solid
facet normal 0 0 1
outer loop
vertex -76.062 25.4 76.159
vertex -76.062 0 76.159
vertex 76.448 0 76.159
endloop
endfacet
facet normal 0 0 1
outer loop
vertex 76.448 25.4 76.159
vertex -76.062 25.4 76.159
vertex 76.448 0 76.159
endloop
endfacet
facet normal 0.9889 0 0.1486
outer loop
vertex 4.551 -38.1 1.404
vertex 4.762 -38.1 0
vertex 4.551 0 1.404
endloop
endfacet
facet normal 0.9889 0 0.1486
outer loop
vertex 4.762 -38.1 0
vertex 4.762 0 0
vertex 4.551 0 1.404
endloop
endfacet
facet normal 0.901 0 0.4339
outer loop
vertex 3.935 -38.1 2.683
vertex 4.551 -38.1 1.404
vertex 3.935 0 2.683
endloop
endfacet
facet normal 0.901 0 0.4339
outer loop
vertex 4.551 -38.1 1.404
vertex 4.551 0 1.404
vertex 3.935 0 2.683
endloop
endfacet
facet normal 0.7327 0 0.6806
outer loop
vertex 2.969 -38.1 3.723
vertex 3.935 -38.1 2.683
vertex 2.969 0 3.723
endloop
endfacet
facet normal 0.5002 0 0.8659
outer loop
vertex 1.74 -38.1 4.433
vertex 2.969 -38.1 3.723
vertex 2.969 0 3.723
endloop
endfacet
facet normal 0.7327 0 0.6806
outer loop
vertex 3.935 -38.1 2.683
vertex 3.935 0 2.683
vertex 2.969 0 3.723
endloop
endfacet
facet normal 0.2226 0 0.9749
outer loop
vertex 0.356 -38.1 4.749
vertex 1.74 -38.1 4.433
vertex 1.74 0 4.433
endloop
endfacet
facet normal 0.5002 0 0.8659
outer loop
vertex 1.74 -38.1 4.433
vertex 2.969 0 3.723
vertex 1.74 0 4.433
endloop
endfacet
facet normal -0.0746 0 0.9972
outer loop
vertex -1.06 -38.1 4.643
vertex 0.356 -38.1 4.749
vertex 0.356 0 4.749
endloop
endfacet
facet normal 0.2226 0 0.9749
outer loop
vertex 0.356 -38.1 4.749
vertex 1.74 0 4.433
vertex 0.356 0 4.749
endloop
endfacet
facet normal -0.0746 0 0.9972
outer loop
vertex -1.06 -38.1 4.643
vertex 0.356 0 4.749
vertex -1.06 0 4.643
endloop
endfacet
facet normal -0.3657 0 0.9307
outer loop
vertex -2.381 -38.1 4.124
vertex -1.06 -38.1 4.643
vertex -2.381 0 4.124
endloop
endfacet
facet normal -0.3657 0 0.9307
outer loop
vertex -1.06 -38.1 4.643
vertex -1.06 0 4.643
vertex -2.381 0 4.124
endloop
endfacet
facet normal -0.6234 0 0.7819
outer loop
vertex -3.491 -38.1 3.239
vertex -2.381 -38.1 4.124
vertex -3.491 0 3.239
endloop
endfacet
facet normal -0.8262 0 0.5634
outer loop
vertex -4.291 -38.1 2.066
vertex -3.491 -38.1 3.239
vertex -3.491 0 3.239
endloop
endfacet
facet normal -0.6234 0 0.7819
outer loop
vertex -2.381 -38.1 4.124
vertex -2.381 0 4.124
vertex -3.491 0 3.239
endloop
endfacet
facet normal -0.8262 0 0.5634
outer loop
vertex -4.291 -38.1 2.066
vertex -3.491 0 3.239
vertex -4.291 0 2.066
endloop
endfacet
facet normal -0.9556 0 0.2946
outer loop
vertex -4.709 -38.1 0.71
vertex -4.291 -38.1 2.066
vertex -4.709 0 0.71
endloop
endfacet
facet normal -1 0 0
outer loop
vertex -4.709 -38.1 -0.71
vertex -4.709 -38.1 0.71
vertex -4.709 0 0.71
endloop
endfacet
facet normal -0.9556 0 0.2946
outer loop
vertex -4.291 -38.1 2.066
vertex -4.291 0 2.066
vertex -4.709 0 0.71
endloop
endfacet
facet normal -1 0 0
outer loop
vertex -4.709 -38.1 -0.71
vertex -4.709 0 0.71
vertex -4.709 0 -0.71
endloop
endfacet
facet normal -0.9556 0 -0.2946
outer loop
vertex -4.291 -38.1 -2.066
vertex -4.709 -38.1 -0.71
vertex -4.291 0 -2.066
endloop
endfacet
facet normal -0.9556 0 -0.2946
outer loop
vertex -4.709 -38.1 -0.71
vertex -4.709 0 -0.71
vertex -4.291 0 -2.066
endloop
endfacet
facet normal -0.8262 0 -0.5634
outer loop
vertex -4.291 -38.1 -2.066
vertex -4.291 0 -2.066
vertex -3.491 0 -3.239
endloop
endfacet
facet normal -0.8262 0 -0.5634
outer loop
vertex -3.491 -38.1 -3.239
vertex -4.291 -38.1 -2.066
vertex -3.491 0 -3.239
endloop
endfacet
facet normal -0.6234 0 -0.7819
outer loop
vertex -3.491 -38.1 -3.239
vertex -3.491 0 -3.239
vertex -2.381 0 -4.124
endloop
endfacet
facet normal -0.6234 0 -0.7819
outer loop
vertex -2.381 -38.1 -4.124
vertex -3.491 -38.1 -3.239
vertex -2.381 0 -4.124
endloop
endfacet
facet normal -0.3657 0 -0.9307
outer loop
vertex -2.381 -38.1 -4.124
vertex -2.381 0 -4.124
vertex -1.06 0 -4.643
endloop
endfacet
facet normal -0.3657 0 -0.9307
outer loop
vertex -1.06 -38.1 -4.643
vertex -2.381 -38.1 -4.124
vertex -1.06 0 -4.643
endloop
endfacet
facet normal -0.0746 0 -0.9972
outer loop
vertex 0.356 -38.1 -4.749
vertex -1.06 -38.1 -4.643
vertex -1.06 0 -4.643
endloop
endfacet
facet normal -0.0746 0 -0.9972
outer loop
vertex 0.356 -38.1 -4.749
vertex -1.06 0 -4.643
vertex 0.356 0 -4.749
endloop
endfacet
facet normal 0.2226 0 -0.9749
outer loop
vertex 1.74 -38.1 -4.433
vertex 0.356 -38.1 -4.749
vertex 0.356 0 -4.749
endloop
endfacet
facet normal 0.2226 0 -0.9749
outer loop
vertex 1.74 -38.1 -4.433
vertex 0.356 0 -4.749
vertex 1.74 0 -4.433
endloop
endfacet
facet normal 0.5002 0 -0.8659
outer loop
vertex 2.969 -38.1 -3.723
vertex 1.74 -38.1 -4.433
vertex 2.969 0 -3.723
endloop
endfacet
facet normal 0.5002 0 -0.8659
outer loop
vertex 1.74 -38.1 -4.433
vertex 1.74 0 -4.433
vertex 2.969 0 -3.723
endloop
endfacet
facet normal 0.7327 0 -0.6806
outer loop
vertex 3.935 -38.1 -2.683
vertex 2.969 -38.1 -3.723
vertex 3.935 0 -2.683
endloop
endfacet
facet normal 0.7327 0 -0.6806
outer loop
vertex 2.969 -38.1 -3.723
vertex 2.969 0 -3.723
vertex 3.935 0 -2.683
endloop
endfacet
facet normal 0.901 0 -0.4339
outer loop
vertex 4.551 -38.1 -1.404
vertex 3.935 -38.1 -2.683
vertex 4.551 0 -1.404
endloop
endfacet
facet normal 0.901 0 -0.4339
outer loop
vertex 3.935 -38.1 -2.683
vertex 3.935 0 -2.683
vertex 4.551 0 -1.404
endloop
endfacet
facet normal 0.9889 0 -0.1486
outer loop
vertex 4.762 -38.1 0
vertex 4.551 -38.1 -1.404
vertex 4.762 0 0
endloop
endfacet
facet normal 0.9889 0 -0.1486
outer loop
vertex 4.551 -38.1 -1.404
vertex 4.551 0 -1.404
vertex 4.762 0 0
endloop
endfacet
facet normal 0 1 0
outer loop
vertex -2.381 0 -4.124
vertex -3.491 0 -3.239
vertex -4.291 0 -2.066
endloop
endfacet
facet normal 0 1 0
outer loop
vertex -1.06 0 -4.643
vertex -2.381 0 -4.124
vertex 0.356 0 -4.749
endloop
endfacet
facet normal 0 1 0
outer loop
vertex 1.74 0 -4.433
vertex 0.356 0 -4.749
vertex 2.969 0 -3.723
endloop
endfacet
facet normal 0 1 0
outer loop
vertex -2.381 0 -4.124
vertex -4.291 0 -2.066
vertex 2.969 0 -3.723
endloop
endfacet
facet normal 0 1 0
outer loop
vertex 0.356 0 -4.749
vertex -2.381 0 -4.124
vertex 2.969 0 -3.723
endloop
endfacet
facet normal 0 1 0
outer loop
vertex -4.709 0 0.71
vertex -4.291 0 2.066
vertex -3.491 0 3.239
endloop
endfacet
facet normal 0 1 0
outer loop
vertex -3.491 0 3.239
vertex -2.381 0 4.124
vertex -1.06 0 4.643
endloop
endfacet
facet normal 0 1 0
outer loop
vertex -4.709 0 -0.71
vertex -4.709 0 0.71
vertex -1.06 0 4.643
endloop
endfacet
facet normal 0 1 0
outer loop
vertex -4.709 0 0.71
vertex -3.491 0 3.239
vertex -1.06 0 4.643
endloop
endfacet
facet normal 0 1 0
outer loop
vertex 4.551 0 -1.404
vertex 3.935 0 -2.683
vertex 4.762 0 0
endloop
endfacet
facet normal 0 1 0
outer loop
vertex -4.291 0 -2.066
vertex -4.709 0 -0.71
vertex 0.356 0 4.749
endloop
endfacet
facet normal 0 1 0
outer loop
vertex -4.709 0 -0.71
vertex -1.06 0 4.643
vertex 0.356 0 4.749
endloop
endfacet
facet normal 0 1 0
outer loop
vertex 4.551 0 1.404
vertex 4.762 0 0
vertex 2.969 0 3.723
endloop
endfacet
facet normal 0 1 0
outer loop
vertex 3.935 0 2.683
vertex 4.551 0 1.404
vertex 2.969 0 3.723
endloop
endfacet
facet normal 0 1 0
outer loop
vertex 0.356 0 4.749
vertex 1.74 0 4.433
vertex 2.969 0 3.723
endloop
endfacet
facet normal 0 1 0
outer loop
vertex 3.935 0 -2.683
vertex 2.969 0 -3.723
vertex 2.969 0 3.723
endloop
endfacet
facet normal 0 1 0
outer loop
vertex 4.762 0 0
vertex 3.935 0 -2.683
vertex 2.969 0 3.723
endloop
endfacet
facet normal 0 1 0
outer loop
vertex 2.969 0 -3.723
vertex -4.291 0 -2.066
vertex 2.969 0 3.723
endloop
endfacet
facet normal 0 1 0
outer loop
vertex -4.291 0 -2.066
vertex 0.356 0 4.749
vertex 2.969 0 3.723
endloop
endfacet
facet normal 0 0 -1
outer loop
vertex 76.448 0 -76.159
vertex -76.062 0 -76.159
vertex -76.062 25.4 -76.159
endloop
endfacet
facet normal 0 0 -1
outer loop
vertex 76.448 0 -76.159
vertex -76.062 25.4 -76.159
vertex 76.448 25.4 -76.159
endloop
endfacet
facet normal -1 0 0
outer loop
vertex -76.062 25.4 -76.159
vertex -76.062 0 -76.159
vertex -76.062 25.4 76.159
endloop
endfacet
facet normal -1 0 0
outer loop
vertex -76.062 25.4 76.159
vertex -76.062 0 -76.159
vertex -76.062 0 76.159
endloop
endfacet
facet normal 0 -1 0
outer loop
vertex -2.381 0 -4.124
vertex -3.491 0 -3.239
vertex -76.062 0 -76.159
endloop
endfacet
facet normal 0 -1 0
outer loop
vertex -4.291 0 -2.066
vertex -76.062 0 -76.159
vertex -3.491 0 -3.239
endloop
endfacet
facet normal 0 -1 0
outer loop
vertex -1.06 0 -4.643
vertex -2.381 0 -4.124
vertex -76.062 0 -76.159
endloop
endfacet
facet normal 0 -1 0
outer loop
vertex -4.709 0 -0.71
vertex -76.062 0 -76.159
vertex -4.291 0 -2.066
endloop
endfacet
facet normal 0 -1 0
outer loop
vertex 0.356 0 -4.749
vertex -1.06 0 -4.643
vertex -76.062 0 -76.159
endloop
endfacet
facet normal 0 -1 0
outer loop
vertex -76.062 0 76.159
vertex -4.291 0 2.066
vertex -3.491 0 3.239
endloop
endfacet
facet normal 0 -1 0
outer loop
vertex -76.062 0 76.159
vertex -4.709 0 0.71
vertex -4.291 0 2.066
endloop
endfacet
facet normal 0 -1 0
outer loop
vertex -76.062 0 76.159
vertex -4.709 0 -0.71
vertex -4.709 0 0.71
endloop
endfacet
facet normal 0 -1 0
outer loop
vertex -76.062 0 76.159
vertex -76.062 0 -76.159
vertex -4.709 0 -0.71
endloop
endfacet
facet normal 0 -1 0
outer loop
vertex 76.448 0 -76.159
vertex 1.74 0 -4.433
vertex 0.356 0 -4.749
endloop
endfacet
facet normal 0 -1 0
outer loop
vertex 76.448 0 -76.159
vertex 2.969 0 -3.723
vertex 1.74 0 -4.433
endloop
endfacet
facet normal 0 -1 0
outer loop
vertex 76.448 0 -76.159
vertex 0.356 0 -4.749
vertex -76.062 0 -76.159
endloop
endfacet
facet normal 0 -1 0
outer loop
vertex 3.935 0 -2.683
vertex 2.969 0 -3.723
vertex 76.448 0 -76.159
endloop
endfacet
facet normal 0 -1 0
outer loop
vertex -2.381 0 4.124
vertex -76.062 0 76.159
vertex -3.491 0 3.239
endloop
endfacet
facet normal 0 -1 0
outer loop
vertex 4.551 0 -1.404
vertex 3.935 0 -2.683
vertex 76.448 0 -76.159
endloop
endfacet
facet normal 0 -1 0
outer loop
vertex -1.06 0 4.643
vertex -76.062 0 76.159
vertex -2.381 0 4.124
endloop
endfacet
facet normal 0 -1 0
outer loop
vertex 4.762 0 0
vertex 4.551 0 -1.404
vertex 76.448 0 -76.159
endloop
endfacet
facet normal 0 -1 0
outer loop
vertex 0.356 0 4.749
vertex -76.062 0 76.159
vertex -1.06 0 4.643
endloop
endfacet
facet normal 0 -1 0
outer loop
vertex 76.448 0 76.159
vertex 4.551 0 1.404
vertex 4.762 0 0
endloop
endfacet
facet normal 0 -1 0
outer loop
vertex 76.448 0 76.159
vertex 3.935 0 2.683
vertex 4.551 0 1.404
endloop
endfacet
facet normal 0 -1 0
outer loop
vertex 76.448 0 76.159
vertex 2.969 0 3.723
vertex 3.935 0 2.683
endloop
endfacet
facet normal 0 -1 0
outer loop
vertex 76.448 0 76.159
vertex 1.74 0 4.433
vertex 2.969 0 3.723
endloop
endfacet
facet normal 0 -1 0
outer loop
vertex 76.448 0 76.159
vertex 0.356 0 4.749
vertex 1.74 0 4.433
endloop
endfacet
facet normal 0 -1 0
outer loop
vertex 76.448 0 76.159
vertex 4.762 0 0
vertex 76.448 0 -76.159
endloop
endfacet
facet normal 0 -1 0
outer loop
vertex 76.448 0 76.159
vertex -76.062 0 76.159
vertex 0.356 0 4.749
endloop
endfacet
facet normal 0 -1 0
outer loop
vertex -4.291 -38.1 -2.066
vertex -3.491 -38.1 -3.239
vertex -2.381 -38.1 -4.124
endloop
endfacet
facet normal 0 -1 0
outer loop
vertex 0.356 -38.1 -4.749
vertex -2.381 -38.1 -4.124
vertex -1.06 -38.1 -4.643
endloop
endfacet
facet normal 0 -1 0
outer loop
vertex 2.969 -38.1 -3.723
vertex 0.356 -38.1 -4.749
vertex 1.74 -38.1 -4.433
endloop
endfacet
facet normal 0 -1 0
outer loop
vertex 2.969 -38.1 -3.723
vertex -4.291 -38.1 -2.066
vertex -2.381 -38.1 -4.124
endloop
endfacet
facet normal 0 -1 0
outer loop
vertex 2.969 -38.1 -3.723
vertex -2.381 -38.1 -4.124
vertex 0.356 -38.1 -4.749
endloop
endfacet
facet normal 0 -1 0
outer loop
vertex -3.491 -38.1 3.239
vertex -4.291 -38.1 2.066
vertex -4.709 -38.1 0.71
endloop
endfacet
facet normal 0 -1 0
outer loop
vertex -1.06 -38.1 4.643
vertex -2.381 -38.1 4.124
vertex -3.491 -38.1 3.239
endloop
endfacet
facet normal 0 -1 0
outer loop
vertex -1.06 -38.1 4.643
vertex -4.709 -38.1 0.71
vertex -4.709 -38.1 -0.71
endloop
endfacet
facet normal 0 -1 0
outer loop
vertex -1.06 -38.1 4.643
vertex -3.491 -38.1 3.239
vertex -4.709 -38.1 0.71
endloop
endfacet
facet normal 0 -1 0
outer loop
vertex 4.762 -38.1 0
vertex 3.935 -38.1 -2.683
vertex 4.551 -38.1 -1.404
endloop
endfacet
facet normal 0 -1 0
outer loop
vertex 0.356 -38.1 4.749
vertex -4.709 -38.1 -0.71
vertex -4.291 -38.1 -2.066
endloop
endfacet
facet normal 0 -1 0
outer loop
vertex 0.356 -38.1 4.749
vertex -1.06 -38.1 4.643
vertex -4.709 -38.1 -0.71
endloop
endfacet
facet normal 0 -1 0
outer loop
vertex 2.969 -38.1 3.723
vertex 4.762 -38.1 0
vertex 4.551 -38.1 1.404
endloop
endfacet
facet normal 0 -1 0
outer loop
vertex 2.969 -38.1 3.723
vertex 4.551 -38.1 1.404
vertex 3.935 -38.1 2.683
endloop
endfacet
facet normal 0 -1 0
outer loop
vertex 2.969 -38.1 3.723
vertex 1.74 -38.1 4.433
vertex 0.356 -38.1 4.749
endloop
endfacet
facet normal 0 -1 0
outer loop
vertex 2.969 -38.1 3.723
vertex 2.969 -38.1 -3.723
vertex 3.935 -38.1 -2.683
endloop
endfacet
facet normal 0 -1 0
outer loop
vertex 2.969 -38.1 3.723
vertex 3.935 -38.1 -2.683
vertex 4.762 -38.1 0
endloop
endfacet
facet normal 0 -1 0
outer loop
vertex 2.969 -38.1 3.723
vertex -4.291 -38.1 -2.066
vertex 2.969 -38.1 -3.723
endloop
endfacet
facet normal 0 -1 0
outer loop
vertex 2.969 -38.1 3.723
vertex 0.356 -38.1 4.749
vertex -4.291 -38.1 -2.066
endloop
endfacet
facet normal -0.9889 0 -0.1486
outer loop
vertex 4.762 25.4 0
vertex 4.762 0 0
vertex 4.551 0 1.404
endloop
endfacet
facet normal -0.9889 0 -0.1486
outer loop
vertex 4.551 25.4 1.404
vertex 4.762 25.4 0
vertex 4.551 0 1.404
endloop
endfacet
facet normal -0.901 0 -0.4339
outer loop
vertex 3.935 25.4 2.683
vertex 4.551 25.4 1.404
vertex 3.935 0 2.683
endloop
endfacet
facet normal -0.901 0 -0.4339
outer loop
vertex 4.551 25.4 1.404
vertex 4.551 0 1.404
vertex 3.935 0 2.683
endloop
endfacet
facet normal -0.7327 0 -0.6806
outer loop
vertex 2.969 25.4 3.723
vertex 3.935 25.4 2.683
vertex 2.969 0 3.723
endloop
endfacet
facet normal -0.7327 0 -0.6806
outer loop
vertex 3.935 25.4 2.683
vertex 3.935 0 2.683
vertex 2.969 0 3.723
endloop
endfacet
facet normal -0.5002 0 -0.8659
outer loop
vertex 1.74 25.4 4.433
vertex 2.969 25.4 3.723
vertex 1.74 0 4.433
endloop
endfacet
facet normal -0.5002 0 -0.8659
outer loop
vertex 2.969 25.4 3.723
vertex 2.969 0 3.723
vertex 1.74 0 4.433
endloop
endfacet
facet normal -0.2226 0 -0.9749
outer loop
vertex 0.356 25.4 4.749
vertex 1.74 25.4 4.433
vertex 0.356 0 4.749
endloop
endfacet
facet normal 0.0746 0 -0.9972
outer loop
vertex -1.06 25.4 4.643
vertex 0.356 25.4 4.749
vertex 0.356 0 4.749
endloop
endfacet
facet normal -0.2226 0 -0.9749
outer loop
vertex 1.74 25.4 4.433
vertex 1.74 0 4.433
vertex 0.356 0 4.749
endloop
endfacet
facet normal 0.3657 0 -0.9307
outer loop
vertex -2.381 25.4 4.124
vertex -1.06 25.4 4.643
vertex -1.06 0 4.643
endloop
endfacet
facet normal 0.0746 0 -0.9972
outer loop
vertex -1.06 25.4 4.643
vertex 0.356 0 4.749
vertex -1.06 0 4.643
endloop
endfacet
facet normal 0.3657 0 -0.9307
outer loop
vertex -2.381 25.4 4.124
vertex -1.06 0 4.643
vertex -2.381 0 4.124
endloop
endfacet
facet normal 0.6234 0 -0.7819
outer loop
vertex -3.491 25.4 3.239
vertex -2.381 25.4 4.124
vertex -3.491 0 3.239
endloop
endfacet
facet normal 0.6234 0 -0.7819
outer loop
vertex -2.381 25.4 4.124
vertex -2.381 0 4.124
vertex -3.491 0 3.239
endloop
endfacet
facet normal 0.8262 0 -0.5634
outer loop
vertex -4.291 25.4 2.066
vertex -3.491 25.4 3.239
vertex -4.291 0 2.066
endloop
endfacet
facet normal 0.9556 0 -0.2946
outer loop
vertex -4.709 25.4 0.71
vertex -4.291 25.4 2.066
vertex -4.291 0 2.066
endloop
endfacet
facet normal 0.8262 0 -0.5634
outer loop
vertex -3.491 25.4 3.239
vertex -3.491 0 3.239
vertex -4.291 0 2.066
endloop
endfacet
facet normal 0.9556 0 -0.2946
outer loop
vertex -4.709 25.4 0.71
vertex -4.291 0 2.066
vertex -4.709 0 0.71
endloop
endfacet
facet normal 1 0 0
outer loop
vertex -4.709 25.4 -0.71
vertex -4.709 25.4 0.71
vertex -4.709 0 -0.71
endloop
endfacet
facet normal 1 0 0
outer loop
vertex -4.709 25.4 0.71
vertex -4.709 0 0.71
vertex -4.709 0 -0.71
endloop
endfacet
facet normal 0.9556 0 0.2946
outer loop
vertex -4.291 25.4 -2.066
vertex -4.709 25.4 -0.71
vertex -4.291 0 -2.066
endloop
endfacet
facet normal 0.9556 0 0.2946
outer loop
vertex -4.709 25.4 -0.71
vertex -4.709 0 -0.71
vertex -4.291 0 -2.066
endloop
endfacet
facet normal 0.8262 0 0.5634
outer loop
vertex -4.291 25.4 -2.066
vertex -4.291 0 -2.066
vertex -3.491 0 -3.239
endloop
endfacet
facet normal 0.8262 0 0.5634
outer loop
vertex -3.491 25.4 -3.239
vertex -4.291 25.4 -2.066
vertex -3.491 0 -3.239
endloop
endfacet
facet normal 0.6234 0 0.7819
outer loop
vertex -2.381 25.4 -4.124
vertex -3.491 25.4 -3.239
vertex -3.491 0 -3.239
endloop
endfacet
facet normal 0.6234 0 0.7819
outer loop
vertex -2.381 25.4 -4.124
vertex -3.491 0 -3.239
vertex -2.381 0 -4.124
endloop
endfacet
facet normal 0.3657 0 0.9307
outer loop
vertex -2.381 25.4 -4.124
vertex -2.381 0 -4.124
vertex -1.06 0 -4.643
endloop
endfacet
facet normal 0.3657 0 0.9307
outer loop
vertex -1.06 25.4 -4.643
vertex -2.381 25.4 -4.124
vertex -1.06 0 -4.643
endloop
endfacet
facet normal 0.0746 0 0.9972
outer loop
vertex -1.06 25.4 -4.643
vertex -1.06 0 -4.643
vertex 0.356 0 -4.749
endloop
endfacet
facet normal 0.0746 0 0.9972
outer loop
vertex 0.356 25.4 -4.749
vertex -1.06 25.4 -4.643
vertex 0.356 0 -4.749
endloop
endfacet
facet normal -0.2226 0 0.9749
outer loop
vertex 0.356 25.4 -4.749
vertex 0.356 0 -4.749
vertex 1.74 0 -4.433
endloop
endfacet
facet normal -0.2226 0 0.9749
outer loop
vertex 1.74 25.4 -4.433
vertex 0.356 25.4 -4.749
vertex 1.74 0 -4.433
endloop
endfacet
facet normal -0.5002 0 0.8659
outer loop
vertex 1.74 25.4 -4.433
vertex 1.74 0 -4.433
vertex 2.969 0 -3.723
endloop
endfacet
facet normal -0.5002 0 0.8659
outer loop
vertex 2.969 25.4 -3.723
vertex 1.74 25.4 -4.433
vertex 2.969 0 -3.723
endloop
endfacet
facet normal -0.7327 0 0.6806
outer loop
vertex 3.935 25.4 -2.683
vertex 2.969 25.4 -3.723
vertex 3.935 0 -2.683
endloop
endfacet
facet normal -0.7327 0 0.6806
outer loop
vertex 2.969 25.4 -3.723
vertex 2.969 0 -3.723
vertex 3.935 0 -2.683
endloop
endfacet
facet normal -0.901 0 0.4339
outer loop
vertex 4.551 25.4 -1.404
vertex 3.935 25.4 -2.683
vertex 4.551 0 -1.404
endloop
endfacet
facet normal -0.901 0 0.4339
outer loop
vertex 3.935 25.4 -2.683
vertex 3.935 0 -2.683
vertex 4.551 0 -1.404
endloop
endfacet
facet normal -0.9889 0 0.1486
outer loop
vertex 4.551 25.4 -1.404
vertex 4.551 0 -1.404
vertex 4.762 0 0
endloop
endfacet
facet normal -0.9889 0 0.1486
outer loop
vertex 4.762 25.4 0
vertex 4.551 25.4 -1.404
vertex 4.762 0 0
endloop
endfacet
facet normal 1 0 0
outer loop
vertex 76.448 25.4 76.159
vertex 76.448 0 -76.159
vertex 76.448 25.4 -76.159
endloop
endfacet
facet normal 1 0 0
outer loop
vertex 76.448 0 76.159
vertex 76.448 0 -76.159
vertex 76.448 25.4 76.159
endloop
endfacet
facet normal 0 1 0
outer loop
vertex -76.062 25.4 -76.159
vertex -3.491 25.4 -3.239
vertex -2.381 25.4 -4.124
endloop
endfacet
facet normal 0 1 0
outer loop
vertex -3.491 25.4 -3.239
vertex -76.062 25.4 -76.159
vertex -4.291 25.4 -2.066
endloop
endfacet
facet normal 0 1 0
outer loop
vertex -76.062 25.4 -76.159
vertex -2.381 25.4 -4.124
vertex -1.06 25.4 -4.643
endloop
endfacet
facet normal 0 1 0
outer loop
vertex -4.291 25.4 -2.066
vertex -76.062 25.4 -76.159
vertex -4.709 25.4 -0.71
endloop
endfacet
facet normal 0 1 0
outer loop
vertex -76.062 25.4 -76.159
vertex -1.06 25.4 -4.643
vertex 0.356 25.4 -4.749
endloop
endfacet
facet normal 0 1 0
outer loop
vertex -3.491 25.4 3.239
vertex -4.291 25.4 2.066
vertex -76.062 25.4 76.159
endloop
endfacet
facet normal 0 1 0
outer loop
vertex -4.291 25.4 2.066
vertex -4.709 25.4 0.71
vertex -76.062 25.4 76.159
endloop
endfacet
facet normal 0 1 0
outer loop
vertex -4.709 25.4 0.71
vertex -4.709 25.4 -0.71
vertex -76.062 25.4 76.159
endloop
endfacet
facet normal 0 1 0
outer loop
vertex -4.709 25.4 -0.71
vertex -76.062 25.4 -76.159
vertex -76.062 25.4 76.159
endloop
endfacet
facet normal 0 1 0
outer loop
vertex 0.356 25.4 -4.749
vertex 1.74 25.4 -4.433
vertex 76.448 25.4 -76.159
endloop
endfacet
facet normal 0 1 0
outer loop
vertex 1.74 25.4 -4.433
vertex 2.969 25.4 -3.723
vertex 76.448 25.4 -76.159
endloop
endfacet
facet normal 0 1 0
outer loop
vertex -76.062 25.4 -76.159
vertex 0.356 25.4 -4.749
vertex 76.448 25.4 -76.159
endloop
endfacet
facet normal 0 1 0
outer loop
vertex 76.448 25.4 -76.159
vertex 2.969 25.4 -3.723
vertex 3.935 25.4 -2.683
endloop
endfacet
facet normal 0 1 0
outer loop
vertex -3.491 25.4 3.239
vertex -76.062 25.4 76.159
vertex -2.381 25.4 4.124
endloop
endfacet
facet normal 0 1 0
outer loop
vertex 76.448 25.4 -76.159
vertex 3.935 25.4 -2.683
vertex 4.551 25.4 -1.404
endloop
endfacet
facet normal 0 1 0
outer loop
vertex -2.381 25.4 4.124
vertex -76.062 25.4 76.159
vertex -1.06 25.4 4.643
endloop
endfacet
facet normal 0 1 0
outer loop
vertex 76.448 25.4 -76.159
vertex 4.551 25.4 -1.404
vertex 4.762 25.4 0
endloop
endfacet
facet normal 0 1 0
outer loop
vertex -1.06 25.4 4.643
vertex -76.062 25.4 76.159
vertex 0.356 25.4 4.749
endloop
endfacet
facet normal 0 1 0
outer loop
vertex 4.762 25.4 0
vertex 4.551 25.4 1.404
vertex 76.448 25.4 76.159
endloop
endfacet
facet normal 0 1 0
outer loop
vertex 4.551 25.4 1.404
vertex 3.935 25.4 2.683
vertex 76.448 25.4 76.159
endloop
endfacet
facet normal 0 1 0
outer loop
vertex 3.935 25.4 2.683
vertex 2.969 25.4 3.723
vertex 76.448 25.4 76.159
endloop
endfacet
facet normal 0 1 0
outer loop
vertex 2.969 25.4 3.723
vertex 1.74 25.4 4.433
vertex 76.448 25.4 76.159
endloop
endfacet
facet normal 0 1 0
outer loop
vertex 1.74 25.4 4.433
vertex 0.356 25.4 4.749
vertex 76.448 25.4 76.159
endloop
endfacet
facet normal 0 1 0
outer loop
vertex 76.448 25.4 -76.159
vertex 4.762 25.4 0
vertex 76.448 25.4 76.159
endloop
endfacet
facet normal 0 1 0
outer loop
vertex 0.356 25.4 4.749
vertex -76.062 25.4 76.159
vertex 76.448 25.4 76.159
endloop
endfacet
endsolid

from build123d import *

# Parameters (mm, degrees)
F0_R     = 4.7625
F1_DEPTH = 25.4
F0_W     = 152.5100395083
F0_H     = 152.3174643517
F2_DEPTH = 25.4
F3_DEPTH = 12.7


with BuildPart() as f1:
    # F0 (on Front) → F1 (new body)
    with BuildSketch(Plane.XZ):
        Circle(F0_R)
    extrude(amount=F1_DEPTH)

    # F0 (on Front) → F2 (join)
    with BuildSketch(Plane.XZ):
        with Locations((0.1925639808, 0)):
            Rectangle(F0_W, F0_H)
        Circle(F0_R, mode=Mode.SUBTRACT)
    extrude(amount=-F2_DEPTH)

    # F3 (add): a face of the model
    f3_faces = [f1.faces().sort_by_distance(p)[0] for p in [
        (0, -25.4, 0),
    ]]
    extrude(f3_faces, amount=F3_DEPTH)


solid = f1.part
